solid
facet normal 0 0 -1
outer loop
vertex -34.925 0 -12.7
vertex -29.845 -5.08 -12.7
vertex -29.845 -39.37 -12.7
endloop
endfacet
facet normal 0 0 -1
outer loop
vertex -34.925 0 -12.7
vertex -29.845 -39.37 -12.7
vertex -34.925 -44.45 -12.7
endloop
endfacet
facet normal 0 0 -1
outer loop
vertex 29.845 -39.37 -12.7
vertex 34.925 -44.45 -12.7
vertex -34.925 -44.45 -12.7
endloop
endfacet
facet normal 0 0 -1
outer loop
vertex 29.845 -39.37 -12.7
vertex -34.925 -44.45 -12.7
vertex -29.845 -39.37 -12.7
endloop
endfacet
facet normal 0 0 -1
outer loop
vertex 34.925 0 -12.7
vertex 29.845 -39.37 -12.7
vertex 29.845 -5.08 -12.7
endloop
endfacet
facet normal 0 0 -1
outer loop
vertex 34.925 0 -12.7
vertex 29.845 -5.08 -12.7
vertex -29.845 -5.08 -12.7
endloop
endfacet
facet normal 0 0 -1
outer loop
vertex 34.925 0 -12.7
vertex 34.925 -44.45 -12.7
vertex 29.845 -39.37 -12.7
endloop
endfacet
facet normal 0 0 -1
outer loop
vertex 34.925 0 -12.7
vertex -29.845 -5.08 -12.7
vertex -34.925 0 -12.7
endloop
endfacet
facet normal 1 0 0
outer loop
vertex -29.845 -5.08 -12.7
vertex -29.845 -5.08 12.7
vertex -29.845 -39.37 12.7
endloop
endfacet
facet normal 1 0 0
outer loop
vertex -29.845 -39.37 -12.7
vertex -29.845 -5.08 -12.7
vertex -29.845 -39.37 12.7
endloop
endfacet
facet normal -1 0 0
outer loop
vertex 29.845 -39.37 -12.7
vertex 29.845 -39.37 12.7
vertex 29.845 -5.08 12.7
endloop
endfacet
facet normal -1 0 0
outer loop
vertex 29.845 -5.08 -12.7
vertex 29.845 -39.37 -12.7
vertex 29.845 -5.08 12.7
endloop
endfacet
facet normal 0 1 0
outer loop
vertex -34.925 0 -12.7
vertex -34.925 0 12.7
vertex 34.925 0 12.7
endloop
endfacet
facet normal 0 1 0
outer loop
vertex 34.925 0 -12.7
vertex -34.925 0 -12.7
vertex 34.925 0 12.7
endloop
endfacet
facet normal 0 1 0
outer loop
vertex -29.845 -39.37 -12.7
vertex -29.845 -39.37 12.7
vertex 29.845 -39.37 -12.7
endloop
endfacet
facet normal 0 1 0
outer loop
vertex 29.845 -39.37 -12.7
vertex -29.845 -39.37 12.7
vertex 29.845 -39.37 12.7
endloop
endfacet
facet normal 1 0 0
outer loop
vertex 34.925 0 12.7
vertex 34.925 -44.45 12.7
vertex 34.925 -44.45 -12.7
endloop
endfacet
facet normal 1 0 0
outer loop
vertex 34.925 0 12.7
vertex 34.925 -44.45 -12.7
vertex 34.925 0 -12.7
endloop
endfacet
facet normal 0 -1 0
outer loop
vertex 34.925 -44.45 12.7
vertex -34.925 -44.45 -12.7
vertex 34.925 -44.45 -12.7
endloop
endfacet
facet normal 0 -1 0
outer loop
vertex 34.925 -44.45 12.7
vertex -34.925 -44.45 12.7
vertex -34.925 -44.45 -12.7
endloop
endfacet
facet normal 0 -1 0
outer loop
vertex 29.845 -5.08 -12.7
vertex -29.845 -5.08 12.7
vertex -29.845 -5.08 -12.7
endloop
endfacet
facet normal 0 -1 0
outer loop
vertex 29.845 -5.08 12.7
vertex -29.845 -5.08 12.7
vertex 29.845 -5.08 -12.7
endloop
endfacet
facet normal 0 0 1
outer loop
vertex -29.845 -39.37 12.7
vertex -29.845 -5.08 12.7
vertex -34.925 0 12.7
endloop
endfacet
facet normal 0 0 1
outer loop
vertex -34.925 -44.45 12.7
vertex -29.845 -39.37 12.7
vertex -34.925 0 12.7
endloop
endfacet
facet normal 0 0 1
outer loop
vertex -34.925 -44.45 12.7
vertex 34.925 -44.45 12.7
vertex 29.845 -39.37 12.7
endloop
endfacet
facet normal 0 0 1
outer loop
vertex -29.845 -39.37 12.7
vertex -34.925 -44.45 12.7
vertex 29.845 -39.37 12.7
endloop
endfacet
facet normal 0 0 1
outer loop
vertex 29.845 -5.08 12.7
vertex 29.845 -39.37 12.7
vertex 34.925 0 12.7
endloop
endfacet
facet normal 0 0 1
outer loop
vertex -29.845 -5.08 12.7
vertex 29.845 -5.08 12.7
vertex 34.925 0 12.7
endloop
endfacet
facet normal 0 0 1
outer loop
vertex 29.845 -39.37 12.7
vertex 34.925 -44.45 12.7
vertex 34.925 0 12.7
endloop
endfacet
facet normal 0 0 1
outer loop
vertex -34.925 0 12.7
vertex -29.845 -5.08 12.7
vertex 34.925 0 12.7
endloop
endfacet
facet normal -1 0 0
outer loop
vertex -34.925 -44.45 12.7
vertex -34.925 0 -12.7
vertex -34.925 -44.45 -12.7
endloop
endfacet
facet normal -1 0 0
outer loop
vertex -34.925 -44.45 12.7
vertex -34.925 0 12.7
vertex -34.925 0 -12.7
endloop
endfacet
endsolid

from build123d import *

# Parameters (mm, degrees)
F0_W     = 69.85
F0_H     = 25.4
F1_DEPTH = 5.08
F2_W     = 39.37
F2_H     = 25.4
F3_DEPTH = 5.08
F4_W     = 64.77
F4_H     = 25.4
F5_DEPTH = 5.08
F6_W     = 39.37
F6_H     = 25.4
F7_DEPTH = 5.08


with BuildPart() as f1:
    # F0 (on Front) → F1 (new body)
    with BuildSketch(Plane.XZ):
        Rectangle(F0_W, F0_H)
    extrude(amount=F1_DEPTH)

    # F2 (on face) → F3 (join)
    with BuildSketch(Plane(origin=(-34.925, 0, 0), x_dir=(0, -1, 0), z_dir=(-1, 0, 0))):
        with Locations((24.765, 0)):
            Rectangle(F2_W, F2_H)
    extrude(amount=-F3_DEPTH)

    # F4 (on face) → F5 (join)
    with BuildSketch(Plane.XZ.offset(44.45)):
        with Locations((2.54, 0)):
            Rectangle(F4_W, F4_H)
    extrude(amount=-F5_DEPTH)

    # F6 (on face) → F7 (join)
    with BuildSketch(Plane.YZ.offset(34.925)):
        with Locations((-19.685, 0)):
            Rectangle(F6_W, F6_H)
    extrude(amount=-F7_DEPTH)


solid = f1.part
